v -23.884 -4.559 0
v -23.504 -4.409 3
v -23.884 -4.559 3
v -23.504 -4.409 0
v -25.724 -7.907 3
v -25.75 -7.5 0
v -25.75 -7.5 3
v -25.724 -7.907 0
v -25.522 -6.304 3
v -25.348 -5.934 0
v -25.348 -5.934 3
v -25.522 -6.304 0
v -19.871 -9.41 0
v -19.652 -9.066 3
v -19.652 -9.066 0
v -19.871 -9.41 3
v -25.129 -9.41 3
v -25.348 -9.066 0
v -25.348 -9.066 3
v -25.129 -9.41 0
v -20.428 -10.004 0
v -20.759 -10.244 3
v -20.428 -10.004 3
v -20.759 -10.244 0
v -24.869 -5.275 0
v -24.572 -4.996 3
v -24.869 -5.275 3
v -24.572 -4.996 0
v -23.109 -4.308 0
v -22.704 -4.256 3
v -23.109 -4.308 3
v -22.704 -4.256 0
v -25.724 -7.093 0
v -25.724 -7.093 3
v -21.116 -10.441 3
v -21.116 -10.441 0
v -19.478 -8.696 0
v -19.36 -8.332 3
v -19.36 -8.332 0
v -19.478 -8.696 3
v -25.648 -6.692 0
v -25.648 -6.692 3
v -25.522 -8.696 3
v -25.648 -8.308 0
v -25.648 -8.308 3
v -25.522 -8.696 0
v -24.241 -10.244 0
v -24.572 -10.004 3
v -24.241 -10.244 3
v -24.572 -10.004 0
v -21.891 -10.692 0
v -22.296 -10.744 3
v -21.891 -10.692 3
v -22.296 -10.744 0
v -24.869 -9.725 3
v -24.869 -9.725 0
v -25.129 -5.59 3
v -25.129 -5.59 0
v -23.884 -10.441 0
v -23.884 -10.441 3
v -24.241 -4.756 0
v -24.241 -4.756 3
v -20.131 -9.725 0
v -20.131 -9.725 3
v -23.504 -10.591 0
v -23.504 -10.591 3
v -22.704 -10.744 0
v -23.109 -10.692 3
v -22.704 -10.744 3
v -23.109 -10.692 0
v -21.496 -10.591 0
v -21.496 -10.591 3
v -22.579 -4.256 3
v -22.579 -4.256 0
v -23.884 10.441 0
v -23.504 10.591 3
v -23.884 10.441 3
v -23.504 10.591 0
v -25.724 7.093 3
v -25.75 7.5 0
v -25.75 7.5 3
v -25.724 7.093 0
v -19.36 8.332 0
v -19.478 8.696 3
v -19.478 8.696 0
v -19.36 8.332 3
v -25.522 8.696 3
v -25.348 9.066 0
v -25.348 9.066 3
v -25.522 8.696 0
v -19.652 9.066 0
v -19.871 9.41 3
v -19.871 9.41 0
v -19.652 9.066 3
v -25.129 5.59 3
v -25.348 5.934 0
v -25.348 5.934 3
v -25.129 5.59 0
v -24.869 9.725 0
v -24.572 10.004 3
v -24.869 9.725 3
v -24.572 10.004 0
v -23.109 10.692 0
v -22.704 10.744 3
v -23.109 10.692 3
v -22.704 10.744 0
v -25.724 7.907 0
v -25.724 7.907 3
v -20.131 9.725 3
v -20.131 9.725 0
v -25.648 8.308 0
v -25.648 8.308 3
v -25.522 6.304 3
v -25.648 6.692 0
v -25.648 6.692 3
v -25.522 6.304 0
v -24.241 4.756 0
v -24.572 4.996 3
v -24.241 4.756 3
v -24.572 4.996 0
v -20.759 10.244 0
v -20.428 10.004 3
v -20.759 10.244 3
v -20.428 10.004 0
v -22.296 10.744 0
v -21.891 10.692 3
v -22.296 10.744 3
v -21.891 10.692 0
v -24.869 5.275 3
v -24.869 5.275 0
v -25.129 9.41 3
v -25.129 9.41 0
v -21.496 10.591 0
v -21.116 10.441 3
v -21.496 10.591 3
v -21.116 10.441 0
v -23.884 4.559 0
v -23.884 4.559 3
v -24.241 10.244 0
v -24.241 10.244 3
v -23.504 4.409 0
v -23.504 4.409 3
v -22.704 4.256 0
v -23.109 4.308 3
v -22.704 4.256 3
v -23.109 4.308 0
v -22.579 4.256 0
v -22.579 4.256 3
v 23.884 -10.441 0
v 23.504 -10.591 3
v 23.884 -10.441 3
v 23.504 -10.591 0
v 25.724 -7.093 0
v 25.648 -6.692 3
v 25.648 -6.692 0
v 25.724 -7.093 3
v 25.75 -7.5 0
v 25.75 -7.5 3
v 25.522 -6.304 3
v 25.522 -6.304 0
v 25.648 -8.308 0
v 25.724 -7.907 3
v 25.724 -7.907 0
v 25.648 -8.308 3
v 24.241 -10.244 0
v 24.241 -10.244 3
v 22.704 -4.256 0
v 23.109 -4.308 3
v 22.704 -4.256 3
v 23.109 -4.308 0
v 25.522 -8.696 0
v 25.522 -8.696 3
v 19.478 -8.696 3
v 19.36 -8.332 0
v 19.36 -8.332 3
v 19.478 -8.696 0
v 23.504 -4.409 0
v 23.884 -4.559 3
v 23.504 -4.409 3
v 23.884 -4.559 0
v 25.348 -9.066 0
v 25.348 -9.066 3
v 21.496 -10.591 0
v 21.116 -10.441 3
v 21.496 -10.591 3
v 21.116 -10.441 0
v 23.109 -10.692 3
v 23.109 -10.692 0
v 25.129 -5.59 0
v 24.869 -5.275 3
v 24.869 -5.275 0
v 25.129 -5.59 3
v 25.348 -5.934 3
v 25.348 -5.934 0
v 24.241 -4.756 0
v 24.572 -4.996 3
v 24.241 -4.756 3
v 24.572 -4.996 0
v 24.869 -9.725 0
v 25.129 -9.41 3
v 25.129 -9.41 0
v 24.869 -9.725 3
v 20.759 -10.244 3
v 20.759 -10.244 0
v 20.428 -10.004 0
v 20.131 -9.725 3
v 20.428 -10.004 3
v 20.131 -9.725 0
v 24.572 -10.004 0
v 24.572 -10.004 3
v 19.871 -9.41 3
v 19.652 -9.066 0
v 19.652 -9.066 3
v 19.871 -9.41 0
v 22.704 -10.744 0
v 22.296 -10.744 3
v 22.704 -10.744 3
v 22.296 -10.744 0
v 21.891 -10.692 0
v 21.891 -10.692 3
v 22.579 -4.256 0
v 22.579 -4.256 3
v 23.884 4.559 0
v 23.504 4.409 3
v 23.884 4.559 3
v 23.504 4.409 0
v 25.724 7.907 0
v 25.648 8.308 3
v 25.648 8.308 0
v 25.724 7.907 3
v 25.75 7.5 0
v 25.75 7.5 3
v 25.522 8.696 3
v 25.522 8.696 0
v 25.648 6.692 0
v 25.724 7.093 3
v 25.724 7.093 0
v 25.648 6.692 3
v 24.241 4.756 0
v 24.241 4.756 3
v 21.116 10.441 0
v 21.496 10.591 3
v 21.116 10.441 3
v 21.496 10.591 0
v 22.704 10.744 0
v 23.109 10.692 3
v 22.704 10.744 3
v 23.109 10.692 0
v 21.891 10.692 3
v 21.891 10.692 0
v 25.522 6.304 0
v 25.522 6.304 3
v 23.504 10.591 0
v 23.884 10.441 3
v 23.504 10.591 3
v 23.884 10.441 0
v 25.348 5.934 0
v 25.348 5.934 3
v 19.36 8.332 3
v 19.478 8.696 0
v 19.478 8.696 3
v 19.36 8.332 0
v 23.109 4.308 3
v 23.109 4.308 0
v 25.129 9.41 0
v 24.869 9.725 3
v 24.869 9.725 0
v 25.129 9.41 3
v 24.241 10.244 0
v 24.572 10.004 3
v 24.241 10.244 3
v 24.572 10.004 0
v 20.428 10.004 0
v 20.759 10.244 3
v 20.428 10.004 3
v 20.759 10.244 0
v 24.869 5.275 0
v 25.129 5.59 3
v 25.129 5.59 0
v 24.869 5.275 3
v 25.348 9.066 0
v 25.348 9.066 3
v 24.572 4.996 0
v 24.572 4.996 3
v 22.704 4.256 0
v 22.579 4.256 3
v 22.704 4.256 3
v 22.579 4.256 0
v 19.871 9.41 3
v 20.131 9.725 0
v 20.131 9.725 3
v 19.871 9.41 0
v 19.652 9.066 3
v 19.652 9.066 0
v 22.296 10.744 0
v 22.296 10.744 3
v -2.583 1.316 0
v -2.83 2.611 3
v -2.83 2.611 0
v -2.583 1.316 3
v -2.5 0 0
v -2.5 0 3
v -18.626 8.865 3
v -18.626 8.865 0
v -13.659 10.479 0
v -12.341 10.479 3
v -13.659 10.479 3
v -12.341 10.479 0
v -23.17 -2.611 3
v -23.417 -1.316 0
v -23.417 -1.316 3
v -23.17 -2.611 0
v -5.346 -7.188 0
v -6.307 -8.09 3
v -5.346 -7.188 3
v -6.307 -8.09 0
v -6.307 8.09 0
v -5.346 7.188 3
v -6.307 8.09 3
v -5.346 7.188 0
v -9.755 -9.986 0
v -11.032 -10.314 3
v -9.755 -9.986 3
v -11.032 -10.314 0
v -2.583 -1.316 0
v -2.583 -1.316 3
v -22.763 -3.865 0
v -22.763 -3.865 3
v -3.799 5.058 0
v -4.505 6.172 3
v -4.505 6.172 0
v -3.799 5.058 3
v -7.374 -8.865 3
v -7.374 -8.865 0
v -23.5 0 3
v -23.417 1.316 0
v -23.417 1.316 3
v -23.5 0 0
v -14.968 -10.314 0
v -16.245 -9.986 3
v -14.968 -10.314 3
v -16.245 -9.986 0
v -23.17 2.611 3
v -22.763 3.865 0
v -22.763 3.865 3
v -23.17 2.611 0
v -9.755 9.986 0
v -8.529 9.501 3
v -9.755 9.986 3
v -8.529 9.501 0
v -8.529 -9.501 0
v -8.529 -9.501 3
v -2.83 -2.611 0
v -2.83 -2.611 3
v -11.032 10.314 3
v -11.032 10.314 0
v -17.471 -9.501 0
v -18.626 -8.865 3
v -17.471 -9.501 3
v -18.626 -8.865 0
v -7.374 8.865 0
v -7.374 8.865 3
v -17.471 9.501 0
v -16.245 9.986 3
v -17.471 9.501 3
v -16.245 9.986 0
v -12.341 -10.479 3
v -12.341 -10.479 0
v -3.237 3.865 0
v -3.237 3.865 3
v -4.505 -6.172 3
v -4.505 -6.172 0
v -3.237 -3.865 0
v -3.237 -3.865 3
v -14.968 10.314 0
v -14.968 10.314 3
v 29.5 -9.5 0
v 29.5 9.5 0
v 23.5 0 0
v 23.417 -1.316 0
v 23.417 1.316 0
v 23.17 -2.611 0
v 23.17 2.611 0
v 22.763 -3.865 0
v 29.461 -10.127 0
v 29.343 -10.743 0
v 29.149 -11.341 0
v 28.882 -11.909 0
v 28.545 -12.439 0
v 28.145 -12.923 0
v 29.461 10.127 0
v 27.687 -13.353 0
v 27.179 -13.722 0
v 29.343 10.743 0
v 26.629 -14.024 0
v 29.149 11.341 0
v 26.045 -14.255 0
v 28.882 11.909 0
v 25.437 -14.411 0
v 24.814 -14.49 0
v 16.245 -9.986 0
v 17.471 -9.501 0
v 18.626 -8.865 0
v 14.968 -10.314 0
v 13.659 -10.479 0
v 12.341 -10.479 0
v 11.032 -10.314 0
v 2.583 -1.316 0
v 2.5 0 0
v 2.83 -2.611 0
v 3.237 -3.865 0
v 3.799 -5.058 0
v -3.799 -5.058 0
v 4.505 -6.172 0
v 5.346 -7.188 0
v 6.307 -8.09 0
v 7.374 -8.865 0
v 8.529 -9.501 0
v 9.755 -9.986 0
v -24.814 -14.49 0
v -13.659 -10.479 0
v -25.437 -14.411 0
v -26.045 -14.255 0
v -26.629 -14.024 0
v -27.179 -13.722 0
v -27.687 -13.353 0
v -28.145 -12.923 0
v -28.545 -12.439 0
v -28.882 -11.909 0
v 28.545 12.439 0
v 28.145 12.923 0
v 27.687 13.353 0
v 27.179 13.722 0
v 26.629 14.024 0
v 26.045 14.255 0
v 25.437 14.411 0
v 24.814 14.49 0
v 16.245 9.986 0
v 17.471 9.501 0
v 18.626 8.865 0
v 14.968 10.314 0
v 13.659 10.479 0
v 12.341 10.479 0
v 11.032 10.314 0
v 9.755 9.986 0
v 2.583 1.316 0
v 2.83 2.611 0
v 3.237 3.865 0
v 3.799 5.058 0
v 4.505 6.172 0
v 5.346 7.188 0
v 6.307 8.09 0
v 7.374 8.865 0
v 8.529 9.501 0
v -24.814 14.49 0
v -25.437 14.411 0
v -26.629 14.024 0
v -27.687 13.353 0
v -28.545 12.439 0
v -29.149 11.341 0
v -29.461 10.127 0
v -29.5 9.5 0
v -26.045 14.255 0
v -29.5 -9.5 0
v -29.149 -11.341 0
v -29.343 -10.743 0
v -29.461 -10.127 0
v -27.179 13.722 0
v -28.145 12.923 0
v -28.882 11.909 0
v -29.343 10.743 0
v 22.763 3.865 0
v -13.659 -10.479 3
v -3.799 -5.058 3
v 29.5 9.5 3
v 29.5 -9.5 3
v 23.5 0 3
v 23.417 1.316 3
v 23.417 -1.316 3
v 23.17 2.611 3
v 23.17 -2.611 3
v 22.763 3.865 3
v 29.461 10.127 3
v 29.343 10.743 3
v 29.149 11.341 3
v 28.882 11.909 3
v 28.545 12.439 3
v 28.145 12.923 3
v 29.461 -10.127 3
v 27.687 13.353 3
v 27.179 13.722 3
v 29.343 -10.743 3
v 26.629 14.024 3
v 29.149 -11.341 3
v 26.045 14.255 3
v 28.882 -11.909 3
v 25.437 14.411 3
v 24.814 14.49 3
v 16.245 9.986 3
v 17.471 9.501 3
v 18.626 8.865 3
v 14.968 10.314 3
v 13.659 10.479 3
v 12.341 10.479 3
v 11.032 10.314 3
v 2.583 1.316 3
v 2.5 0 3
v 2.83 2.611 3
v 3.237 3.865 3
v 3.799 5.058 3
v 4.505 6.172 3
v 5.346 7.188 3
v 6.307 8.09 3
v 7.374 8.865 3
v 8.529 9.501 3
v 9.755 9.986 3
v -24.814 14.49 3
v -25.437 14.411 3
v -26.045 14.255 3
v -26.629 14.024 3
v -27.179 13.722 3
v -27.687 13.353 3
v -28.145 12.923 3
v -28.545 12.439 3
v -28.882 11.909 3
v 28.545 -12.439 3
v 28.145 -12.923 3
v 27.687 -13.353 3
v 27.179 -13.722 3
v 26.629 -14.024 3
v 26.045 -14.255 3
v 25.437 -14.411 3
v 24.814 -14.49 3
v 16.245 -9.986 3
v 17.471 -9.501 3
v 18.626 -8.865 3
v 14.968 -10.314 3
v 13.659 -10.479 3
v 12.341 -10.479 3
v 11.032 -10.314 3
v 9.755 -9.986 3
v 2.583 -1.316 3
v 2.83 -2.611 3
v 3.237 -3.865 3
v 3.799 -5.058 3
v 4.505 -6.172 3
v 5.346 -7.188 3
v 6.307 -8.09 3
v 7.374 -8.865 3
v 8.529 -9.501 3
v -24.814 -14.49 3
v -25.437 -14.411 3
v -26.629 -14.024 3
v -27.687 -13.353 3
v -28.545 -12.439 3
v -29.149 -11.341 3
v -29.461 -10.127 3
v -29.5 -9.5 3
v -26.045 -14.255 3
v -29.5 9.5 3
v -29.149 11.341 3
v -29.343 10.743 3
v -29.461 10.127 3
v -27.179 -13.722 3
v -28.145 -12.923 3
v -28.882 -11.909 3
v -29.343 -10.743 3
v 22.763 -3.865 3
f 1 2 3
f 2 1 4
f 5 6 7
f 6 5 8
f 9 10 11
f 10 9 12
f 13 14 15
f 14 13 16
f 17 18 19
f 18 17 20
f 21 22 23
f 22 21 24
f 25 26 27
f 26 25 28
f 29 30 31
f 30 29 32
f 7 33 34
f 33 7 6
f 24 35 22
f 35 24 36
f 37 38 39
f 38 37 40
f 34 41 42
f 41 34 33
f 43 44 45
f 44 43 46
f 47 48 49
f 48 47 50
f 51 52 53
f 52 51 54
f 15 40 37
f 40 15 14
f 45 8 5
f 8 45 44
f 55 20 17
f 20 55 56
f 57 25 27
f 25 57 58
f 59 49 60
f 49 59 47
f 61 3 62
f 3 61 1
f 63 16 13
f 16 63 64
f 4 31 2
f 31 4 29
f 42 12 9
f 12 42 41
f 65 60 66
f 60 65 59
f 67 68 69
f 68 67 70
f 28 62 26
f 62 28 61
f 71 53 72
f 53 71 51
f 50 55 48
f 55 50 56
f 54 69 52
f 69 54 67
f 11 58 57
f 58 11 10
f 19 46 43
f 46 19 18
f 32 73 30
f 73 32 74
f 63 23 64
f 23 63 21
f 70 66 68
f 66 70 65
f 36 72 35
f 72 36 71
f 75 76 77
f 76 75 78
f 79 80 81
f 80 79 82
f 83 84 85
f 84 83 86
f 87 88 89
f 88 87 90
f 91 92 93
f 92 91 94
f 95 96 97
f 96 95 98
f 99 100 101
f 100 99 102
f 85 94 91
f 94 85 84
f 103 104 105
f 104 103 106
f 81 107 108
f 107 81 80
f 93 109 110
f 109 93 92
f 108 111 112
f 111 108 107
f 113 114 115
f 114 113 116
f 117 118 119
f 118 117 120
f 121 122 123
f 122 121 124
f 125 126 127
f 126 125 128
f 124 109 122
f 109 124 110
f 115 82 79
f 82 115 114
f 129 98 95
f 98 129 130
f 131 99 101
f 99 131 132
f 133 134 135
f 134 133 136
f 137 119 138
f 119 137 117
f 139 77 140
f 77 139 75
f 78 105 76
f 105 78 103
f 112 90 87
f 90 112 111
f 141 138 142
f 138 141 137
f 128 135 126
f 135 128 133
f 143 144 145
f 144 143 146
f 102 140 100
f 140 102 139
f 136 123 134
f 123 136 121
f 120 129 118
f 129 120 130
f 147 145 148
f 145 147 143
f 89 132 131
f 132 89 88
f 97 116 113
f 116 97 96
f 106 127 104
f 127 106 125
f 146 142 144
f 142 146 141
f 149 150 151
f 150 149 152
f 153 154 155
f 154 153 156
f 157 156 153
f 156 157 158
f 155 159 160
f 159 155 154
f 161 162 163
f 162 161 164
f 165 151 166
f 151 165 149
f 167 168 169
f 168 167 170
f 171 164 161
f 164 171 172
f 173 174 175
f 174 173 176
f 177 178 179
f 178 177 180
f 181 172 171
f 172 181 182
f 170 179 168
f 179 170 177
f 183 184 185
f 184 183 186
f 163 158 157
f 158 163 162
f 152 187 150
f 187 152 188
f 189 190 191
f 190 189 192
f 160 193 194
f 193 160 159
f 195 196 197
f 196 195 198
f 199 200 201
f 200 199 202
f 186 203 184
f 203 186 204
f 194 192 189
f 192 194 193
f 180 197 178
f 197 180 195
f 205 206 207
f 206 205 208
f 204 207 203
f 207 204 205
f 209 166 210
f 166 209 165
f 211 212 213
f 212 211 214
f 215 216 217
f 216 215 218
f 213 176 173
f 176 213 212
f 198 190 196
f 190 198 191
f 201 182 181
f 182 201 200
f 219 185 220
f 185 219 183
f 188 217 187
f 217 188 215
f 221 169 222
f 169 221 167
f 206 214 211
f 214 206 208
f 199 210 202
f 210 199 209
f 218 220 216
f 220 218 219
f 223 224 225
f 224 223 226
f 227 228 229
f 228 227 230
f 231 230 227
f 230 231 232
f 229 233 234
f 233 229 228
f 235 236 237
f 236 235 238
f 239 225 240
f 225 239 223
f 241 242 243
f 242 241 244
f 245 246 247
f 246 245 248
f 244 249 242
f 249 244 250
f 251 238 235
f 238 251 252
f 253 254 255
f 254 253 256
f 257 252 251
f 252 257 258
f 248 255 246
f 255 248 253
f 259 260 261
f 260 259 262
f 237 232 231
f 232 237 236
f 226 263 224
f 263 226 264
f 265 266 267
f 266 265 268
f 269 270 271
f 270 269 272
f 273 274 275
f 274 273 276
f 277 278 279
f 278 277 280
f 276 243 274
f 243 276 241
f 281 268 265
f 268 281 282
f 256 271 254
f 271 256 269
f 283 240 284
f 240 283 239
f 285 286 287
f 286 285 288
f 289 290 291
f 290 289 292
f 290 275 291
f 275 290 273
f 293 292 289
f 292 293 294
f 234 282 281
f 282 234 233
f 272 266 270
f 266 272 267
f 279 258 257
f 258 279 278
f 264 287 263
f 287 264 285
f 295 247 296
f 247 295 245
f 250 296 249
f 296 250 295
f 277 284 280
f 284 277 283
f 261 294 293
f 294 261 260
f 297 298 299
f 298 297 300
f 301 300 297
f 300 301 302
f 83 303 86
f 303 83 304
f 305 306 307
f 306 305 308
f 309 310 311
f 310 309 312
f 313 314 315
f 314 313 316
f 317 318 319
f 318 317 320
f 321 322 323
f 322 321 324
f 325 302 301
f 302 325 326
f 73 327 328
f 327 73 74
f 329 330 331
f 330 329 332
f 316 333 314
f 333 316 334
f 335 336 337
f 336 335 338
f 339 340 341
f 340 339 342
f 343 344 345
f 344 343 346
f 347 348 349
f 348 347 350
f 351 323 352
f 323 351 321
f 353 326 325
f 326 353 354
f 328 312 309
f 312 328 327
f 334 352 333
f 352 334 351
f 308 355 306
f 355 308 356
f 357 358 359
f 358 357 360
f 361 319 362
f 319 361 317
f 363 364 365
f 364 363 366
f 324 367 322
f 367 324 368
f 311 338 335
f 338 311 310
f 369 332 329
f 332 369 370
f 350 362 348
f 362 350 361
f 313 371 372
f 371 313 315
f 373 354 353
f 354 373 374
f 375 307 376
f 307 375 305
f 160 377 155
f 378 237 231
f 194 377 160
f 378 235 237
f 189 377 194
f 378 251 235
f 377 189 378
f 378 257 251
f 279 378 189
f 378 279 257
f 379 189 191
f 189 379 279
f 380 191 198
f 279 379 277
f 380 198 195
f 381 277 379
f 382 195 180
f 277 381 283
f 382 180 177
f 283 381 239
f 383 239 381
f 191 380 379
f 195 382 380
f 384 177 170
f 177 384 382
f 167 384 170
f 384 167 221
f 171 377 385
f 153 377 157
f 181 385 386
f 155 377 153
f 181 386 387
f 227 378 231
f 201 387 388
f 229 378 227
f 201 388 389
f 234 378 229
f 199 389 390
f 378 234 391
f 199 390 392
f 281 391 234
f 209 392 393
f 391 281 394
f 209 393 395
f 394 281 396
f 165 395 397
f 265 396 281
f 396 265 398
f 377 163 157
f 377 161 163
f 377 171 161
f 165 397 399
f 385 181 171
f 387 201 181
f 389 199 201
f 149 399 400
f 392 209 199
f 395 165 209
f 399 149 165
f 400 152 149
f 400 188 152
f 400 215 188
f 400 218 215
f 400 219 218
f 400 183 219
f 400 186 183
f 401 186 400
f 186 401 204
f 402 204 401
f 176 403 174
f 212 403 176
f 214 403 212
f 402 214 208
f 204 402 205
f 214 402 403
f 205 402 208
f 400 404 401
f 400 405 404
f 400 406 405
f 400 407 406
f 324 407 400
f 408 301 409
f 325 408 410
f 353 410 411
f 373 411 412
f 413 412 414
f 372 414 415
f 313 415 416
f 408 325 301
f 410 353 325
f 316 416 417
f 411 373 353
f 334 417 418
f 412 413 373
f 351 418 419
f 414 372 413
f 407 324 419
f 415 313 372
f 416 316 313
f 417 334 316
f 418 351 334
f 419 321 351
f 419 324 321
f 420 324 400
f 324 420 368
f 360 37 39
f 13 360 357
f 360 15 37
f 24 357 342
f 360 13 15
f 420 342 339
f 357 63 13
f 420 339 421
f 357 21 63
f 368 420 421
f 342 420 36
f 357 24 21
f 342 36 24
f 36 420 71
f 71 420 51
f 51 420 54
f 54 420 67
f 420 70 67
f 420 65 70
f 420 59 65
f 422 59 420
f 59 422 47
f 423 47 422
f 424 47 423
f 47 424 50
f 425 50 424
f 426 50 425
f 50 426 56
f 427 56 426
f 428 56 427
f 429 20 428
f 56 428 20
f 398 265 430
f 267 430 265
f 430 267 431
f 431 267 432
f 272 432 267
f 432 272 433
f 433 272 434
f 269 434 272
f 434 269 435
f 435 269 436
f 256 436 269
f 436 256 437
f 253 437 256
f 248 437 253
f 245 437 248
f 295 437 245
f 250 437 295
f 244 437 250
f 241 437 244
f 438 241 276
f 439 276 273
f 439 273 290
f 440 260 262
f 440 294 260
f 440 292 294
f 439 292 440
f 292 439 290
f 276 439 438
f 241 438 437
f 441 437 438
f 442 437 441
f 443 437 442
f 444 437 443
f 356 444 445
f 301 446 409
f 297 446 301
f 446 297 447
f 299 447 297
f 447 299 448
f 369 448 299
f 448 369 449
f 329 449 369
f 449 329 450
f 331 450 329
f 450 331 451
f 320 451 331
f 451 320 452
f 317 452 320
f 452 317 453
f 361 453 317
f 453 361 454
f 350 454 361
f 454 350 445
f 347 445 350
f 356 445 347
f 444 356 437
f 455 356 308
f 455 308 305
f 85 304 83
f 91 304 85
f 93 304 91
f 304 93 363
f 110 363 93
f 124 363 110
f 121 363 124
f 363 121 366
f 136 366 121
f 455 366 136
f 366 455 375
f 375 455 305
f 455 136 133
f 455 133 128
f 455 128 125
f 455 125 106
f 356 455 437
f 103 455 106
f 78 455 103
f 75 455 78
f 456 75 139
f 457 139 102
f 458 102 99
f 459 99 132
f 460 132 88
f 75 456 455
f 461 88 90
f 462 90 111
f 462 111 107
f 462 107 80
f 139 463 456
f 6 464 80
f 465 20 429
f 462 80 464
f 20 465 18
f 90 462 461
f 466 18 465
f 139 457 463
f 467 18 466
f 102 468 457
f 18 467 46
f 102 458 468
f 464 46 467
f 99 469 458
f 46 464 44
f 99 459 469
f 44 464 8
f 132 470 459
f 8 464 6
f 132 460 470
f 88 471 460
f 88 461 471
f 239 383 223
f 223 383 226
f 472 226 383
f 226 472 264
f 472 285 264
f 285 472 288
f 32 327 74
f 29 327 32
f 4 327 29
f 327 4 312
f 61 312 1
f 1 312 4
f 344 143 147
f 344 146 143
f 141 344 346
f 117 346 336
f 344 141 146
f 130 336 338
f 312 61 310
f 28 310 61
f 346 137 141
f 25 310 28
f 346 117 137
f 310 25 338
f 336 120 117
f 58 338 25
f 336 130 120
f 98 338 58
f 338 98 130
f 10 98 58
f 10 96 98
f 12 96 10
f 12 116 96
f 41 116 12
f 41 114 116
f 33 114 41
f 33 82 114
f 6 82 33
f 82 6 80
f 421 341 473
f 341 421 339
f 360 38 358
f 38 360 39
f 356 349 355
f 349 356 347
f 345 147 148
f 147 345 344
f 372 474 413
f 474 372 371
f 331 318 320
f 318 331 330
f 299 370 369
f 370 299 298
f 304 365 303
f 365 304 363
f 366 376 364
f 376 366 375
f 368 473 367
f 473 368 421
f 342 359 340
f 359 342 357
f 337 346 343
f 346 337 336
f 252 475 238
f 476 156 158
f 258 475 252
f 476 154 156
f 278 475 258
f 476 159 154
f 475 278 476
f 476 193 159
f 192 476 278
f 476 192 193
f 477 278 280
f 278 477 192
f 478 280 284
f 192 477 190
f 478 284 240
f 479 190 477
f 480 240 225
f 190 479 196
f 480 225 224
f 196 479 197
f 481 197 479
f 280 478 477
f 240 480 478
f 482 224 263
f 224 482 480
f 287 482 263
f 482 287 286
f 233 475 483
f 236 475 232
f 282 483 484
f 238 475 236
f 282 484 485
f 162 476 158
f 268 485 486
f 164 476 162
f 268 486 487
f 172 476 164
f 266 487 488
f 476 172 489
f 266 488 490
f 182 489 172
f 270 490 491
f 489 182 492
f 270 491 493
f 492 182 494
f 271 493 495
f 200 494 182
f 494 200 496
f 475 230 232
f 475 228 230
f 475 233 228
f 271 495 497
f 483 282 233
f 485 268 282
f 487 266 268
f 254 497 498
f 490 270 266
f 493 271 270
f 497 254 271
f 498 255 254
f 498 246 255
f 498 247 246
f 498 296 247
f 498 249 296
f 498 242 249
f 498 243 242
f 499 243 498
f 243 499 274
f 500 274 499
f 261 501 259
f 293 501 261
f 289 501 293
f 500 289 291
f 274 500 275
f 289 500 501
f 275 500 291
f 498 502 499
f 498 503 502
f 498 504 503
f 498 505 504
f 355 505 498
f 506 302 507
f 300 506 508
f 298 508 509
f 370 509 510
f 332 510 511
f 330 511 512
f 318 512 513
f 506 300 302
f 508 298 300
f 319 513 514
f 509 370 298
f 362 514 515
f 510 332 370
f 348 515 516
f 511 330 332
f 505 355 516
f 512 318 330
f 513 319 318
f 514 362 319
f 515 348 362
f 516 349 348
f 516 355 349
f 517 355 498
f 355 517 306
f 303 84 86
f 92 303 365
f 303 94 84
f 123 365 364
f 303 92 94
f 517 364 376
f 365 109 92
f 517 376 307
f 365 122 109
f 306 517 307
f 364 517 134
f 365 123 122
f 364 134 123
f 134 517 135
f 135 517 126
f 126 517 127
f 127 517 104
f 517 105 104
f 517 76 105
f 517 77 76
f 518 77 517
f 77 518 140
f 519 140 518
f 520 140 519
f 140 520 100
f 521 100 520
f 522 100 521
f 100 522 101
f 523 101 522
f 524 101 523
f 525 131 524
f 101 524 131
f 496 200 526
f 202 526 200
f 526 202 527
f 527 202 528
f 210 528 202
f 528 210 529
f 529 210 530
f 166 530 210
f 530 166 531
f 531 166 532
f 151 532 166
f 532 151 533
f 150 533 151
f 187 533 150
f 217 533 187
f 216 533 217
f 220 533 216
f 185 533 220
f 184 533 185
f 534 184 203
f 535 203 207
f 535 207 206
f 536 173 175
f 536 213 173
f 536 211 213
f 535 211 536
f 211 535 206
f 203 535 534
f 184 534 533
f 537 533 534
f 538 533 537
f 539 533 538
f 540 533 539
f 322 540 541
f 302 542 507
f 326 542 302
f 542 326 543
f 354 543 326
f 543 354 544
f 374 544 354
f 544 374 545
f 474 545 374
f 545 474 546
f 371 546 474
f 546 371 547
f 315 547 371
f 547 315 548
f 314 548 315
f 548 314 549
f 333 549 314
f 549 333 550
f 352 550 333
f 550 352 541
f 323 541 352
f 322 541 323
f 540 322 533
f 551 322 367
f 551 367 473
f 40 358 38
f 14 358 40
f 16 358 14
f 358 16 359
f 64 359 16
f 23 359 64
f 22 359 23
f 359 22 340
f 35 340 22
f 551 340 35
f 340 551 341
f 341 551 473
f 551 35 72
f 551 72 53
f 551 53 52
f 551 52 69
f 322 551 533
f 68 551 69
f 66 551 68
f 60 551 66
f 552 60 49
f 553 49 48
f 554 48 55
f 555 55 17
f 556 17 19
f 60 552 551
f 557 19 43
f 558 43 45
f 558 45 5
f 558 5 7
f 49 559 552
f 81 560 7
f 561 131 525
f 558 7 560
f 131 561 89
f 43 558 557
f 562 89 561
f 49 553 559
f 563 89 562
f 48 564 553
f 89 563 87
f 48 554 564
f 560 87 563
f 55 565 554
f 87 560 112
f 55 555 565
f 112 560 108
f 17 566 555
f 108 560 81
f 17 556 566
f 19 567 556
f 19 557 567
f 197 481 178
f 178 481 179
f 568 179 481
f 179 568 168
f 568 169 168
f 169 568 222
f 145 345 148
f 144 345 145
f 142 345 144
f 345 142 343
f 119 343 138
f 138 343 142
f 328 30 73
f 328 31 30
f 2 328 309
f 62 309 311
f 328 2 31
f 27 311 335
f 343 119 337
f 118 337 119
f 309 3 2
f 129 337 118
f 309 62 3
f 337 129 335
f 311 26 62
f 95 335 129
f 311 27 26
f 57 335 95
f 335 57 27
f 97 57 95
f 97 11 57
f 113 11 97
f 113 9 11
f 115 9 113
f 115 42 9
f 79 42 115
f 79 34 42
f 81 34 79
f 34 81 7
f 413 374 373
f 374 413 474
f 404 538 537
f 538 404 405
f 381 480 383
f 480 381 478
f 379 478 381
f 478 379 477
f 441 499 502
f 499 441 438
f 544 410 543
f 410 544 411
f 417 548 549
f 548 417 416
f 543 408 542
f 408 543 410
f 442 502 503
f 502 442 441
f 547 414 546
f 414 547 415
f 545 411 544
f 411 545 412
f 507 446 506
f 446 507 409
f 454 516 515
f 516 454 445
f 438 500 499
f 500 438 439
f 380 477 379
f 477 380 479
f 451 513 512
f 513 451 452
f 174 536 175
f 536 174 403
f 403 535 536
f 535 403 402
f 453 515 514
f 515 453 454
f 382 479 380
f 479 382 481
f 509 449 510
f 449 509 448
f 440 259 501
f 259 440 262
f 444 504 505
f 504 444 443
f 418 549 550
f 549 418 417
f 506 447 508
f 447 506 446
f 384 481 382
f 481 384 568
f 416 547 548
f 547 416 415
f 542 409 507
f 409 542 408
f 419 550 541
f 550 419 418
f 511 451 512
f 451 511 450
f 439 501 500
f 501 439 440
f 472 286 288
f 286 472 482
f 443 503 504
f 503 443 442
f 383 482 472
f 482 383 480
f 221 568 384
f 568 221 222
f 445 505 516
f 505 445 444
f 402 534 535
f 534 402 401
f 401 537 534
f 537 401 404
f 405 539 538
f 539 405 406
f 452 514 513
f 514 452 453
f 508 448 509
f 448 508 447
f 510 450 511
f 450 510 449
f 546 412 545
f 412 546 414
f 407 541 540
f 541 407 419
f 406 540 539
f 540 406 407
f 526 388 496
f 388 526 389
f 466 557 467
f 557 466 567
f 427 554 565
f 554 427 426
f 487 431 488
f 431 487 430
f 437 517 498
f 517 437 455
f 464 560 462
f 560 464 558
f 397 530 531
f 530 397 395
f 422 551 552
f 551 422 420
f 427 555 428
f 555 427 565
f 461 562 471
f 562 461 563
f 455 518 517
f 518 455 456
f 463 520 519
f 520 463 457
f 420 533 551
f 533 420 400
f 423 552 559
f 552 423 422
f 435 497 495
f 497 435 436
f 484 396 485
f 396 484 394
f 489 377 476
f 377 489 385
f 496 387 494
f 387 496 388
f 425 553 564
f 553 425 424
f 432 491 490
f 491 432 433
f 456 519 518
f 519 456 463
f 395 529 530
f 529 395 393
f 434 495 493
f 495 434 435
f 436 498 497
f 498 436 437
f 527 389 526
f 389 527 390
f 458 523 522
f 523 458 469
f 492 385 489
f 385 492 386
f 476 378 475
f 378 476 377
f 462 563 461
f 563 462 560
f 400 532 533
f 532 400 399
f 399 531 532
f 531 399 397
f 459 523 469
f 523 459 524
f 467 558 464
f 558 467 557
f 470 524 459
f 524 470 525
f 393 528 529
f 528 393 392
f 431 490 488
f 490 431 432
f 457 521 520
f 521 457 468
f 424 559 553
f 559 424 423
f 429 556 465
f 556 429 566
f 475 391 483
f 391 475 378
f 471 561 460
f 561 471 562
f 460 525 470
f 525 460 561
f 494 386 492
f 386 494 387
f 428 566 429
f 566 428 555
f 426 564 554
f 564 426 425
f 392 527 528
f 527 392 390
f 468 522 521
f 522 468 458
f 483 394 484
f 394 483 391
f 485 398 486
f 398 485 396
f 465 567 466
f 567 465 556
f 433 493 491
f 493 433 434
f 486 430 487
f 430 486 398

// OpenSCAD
$fn = 50;


difference() {
	union() {
		hull() {
			translate(v = [-24.5000000000, 9.5000000000, 0]) {
				cylinder(h = 3, r = 5);
			}
			translate(v = [24.5000000000, 9.5000000000, 0]) {
				cylinder(h = 3, r = 5);
			}
			translate(v = [-24.5000000000, -9.5000000000, 0]) {
				cylinder(h = 3, r = 5);
			}
			translate(v = [24.5000000000, -9.5000000000, 0]) {
				cylinder(h = 3, r = 5);
			}
		}
	}
	union() {
		#translate(v = [-22.5000000000, -7.5000000000, -100.0000000000]) {
			cylinder(h = 200, r = 3.2500000000);
		}
		#translate(v = [-22.5000000000, 7.5000000000, -100.0000000000]) {
			cylinder(h = 200, r = 3.2500000000);
		}
		#translate(v = [22.5000000000, -7.5000000000, -100.0000000000]) {
			cylinder(h = 200, r = 3.2500000000);
		}
		#translate(v = [22.5000000000, 7.5000000000, -100.0000000000]) {
			cylinder(h = 200, r = 3.2500000000);
		}
		#translate(v = [-13.0000000000, 0, 0]) {
			cylinder(h = 3, r = 10.5000000000);
		}
		#translate(v = [13.0000000000, 0, 0]) {
			cylinder(h = 3, r = 10.5000000000);
		}
	}
}
